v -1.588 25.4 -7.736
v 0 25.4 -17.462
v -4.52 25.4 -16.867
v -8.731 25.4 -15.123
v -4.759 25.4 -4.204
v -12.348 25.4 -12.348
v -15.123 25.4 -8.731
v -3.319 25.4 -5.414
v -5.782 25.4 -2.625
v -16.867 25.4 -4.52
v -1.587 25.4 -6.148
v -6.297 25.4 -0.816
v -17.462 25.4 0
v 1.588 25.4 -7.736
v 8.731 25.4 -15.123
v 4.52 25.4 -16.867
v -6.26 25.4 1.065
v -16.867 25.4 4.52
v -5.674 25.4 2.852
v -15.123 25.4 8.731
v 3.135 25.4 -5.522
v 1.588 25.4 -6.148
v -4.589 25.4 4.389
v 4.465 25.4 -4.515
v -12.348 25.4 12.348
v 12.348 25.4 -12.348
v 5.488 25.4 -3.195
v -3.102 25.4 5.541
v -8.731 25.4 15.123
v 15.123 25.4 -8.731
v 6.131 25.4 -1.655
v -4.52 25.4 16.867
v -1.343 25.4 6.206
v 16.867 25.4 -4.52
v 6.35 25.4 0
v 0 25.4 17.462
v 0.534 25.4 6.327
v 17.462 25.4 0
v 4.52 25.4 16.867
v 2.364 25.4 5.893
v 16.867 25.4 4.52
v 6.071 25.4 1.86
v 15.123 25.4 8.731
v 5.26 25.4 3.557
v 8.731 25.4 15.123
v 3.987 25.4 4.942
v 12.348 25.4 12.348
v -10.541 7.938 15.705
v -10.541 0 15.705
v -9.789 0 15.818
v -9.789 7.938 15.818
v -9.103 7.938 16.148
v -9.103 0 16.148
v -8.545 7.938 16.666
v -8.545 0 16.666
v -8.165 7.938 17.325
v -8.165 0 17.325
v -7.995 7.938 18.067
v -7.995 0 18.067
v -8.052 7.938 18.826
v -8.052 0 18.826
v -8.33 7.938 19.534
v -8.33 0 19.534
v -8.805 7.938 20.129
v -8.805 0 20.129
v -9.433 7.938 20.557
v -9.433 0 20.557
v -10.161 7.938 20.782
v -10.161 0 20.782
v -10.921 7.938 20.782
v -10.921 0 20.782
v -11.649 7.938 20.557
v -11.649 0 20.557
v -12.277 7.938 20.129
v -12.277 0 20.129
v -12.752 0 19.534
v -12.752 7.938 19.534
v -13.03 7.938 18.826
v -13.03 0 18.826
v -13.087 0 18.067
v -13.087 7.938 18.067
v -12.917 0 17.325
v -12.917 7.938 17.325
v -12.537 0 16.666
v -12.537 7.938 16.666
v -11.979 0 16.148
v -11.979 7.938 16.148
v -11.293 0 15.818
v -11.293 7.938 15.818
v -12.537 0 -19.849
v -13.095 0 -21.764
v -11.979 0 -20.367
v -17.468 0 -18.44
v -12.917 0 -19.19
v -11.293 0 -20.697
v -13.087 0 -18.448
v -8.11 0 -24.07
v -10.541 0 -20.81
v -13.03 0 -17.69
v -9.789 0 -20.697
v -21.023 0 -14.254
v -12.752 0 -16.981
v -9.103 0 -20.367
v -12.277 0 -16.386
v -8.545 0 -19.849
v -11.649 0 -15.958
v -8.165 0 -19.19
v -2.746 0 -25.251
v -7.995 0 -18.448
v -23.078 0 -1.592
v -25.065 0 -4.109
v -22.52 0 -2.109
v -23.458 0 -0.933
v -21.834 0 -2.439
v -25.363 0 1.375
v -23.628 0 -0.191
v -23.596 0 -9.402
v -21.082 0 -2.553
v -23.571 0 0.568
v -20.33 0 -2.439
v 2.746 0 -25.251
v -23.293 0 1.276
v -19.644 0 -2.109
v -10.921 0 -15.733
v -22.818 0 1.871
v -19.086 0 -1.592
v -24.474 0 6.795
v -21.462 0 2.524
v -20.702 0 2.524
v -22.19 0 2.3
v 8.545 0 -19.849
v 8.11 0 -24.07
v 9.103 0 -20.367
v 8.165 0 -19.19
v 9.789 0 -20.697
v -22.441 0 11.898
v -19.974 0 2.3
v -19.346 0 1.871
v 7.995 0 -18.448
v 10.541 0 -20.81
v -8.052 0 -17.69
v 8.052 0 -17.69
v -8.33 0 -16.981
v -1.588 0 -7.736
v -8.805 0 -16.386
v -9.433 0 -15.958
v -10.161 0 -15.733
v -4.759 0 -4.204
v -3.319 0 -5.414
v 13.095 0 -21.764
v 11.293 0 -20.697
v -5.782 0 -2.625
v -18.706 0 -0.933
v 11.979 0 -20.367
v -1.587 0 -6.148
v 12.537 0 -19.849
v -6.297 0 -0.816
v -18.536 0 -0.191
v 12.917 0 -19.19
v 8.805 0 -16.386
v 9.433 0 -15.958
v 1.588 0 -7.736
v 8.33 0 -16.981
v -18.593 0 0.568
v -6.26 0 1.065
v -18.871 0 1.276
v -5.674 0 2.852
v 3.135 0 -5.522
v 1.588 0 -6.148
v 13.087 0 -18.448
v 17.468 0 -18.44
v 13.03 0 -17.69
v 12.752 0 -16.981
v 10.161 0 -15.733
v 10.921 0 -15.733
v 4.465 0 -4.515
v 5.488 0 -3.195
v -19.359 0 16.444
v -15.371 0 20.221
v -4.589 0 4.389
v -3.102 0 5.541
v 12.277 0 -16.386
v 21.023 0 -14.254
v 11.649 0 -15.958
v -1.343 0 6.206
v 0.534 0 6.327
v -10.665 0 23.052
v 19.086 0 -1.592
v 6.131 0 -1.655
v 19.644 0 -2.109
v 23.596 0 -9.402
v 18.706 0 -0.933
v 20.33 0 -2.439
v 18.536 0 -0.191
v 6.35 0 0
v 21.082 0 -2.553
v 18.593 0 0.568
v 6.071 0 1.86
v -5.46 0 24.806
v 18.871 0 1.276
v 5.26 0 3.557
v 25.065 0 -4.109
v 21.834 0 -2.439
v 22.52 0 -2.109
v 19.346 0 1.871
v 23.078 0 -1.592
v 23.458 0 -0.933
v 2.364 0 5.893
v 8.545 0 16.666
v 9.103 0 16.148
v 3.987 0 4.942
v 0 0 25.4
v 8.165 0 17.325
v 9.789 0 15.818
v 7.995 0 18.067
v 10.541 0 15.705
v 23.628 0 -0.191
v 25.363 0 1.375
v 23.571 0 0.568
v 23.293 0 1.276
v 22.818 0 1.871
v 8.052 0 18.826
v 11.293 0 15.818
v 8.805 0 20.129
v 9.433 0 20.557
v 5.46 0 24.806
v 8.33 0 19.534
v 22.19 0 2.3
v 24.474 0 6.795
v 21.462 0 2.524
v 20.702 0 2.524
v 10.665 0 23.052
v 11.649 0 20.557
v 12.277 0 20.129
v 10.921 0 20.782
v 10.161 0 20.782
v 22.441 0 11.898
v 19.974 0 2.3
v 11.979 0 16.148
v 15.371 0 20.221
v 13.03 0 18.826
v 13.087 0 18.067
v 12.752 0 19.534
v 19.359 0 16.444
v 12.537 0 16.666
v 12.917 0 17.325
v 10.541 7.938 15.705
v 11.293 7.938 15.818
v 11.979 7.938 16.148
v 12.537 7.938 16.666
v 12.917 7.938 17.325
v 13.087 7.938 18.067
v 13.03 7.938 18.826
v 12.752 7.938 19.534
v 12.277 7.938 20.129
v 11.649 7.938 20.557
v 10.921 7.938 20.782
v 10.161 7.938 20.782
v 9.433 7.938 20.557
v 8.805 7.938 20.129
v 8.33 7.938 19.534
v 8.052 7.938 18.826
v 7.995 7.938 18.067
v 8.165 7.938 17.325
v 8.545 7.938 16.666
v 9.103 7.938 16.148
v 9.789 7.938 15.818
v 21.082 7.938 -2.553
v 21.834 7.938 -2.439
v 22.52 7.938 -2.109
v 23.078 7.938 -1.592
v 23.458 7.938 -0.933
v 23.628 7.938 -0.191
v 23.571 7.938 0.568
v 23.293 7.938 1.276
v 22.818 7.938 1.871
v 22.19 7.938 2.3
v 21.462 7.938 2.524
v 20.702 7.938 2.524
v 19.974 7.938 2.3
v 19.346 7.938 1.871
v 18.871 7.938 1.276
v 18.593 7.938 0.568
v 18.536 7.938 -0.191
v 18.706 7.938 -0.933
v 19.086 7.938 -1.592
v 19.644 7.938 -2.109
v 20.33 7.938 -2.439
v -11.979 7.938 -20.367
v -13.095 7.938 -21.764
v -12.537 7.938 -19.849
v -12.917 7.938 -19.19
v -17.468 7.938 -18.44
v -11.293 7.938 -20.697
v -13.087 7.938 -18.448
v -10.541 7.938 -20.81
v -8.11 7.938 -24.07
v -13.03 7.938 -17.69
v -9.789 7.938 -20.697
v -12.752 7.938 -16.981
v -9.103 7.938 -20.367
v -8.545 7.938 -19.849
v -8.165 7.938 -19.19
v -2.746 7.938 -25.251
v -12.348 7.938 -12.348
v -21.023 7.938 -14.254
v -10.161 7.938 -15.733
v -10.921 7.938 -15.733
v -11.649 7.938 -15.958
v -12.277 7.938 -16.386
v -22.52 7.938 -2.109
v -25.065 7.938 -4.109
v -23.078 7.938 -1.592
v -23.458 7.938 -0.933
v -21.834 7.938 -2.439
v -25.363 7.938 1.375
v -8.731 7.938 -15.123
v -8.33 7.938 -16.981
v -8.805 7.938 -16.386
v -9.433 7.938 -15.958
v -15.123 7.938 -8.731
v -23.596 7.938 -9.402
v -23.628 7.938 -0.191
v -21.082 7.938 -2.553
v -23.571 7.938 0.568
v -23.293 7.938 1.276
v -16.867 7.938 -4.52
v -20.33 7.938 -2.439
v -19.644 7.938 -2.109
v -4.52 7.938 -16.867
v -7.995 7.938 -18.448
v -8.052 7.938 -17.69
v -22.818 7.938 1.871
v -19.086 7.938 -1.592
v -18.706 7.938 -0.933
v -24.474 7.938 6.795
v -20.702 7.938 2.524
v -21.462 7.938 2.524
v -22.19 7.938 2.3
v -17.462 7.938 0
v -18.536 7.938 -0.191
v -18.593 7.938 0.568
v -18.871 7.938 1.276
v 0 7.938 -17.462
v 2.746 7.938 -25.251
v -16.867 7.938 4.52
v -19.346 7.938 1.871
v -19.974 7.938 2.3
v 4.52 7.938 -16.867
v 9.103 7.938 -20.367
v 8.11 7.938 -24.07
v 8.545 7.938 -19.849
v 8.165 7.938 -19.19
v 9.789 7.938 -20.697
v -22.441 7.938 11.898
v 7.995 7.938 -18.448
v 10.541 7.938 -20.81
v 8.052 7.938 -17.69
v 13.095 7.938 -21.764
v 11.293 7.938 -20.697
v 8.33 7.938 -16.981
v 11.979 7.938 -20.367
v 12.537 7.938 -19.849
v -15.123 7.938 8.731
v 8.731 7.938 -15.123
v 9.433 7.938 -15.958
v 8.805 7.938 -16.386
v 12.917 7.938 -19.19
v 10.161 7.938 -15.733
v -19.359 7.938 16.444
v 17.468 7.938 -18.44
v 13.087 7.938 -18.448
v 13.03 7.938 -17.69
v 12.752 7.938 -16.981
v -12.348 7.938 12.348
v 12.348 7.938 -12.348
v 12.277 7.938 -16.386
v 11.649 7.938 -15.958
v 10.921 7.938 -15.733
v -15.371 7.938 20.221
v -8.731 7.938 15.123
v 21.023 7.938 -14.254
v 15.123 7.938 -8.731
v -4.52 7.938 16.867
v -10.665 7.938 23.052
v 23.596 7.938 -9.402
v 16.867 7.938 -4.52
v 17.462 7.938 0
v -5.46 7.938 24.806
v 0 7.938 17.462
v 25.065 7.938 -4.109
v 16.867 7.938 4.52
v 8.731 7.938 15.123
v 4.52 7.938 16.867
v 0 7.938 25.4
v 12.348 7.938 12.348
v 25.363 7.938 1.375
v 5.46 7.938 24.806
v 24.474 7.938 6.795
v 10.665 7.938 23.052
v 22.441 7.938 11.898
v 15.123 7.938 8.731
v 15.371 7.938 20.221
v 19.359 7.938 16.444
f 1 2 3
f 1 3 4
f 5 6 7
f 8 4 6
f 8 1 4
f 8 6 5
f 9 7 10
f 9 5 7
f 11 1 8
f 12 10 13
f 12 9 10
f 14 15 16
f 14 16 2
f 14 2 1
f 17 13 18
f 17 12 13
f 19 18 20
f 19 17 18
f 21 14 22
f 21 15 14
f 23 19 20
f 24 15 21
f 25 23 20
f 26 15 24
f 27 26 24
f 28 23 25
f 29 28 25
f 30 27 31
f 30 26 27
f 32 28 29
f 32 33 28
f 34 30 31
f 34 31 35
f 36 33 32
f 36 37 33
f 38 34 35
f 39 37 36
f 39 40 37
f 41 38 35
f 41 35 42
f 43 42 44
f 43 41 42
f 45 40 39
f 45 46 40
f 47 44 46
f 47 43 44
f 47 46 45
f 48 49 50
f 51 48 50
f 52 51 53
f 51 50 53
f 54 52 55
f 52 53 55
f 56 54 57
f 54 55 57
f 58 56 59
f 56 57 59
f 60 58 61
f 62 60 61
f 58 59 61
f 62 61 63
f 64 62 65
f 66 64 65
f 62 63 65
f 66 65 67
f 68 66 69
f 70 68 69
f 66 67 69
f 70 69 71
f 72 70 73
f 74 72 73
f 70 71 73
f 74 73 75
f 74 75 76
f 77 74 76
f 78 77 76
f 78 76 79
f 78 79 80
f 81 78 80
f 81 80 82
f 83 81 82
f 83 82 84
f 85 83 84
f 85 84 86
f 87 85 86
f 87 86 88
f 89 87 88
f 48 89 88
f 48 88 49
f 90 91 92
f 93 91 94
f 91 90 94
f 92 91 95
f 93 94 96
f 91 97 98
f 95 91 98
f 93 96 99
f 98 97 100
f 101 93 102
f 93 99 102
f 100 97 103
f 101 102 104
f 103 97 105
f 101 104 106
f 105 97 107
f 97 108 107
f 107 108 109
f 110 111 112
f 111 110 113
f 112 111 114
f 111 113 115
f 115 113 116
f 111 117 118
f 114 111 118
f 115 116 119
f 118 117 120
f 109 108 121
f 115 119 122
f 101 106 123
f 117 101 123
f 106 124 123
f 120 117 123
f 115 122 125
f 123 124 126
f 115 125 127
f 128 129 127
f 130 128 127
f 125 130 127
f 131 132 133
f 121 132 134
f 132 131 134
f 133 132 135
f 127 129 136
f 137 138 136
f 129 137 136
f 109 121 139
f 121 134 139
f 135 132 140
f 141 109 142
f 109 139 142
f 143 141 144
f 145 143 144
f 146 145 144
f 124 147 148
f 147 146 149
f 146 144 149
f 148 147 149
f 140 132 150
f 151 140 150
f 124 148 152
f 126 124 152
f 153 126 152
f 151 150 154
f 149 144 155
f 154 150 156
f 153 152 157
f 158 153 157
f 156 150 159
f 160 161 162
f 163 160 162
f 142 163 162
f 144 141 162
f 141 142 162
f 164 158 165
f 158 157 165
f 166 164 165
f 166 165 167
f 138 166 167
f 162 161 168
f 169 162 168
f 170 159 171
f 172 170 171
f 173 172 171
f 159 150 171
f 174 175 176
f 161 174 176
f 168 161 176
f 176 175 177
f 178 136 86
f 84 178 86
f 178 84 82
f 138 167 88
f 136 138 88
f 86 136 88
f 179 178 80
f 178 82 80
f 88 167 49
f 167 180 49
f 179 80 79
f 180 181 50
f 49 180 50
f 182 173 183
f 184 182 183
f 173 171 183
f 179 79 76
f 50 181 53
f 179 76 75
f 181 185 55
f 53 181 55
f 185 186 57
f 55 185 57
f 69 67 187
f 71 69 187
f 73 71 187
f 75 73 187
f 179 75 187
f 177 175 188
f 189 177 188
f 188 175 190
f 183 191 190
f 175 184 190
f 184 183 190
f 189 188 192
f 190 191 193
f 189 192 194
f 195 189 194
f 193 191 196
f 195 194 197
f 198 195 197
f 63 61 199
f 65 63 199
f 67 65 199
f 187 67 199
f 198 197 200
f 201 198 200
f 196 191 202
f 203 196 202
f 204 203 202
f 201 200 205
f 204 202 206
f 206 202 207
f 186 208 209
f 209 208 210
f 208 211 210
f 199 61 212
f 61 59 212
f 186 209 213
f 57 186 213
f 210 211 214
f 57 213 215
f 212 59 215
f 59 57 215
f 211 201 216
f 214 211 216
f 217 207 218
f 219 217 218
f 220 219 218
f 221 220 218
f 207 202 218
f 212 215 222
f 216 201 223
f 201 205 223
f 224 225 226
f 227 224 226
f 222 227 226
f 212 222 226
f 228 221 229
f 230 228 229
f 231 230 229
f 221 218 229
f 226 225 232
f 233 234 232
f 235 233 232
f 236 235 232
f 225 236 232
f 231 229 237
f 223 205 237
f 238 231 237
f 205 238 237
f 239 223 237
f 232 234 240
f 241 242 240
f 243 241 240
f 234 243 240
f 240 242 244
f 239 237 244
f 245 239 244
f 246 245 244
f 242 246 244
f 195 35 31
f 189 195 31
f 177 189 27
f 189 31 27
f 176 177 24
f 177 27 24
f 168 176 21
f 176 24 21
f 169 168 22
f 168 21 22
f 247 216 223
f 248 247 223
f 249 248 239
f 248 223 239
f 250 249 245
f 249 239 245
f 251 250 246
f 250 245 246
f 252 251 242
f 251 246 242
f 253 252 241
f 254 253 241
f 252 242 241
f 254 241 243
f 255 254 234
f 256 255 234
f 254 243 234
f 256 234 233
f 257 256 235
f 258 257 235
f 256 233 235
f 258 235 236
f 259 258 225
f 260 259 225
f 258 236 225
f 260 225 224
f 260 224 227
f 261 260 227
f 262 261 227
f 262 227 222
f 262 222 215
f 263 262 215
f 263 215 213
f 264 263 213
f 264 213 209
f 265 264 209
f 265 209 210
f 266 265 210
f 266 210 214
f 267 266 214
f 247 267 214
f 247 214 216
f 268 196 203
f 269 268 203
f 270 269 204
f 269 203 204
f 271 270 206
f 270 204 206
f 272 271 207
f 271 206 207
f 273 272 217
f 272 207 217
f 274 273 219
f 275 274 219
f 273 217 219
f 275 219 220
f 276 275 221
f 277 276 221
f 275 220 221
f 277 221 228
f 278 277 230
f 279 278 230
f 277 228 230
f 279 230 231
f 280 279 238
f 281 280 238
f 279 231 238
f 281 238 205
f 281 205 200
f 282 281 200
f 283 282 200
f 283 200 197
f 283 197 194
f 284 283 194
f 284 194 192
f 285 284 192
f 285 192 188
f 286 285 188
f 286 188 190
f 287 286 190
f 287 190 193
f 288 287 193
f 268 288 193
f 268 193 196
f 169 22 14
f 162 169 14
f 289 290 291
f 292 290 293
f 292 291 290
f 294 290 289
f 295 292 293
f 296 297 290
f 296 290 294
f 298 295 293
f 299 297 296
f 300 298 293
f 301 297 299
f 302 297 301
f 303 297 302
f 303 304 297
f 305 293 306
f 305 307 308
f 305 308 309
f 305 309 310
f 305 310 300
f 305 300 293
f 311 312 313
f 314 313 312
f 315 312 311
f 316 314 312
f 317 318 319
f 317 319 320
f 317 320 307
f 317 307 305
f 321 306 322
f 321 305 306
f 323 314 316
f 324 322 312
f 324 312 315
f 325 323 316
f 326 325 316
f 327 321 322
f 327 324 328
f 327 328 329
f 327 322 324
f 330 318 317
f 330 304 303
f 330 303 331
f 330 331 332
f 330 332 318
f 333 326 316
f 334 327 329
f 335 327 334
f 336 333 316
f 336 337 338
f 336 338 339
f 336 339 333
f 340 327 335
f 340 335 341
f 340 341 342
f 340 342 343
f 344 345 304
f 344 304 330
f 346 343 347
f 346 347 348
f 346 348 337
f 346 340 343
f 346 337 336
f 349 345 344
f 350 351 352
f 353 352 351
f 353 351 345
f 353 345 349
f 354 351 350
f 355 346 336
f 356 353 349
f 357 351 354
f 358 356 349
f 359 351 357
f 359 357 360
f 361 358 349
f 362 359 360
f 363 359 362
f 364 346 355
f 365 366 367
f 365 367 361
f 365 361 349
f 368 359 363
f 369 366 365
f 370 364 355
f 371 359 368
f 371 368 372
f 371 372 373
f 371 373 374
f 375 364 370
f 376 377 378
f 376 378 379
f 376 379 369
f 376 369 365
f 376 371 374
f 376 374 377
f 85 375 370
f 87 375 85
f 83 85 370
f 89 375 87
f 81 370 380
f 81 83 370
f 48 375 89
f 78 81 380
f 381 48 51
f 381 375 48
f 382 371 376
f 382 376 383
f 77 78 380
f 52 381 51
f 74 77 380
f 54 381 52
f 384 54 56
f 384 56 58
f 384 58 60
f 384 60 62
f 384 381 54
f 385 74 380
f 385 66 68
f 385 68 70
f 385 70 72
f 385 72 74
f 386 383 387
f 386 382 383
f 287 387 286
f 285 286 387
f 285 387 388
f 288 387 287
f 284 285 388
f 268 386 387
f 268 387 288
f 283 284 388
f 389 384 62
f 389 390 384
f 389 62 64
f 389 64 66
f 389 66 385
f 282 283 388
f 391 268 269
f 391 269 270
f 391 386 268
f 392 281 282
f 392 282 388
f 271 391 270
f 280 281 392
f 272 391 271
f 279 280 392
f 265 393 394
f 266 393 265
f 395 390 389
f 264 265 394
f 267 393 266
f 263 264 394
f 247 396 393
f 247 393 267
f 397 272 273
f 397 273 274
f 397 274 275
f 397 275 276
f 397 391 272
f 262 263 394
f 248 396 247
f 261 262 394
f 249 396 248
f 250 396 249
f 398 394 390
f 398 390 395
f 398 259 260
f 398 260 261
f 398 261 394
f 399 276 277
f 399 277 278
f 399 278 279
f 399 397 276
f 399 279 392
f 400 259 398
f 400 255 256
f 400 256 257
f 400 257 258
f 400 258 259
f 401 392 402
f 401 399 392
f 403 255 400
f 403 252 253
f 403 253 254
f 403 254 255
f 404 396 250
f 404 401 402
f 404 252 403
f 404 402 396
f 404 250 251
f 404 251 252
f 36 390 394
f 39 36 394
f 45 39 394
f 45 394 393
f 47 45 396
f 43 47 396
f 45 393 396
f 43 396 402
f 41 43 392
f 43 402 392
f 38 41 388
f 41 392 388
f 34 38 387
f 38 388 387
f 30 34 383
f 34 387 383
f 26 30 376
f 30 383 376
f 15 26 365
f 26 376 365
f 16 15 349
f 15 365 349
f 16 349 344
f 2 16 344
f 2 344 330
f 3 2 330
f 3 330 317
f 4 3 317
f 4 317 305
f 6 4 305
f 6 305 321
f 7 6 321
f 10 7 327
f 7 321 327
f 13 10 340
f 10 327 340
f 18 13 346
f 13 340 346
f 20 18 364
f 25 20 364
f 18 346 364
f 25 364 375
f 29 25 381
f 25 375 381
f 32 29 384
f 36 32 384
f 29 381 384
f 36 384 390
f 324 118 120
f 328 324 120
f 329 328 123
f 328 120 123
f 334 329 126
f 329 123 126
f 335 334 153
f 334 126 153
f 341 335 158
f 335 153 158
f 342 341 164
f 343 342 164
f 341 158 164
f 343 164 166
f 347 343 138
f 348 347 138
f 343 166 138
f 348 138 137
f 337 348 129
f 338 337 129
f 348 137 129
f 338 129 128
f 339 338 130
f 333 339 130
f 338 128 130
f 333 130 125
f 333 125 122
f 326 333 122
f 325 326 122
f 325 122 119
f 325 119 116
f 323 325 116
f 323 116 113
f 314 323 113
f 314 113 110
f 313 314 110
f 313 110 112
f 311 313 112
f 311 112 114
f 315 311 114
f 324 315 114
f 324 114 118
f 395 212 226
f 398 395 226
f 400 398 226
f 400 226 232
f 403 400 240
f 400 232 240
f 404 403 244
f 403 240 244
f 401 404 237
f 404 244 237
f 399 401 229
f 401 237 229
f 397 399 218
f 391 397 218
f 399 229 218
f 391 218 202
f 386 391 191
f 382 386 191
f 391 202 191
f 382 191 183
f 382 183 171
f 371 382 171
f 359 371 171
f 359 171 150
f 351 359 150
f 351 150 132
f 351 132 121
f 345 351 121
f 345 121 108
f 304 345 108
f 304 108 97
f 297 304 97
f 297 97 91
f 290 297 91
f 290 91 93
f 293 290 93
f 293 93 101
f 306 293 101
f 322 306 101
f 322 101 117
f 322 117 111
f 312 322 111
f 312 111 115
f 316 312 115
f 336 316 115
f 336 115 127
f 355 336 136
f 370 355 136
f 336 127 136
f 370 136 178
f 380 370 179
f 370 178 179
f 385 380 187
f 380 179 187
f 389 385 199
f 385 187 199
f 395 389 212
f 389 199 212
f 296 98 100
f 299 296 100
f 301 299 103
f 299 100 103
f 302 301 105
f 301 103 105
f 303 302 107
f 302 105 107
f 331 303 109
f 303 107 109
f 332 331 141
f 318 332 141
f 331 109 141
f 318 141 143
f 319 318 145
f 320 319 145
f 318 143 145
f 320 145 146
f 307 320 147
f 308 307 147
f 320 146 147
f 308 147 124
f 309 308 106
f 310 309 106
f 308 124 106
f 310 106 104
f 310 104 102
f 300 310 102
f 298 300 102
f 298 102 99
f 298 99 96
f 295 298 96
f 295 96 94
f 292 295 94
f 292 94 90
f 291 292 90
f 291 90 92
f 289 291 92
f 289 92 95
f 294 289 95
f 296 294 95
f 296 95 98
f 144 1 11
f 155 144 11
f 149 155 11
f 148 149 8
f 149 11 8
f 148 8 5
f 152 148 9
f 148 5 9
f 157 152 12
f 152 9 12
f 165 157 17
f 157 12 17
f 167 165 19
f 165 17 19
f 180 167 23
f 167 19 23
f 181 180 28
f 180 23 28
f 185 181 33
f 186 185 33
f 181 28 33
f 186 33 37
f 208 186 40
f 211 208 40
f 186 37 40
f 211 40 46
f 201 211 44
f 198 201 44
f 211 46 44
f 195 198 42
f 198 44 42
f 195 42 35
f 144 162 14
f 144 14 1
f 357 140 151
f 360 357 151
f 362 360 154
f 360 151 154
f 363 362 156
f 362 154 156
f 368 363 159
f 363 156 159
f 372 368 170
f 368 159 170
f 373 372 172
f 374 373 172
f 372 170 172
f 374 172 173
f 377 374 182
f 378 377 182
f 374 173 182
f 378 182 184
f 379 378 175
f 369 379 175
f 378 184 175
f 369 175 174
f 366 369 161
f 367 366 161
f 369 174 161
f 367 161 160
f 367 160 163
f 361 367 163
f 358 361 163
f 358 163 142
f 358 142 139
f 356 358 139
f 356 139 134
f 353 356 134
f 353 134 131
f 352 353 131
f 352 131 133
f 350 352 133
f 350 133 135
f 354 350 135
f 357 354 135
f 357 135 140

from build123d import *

# Parameters (mm, degrees)
SKETCH1_R              = 25.4
BOSS_EXTRUDE1_DEPTH    = 25.4
CUT_EXTRUDE1_START     = -17.4625
SKETCH2_R              = 25.4
SKETCH2_R_2            = 17.4625
CUT_EXTRUDE1_DEPTH     = 17.4625
CUT_EXTRUDE2_DEPTH     = 44.994090512
F_10_CLEARANCE_HOLE1_D = 5.1054


with BuildPart() as part:
    # Sketch1 → Boss-Extrude1 (new body)
    with BuildSketch(Plane(origin=(0, 0, 0), x_dir=(1, 0, 0), z_dir=(0, 1, 0))):
        with Locations(Location((0, 0, 0), (0, 0, 270))):
            Circle(SKETCH1_R)
    extrude(amount=BOSS_EXTRUDE1_DEPTH)

    # Sketch2 → Cut-Extrude1 (cut)
    with BuildSketch(Plane(origin=(0, 25.4, 0), x_dir=(1, 0, 0), z_dir=(0, 1, 0)).offset(CUT_EXTRUDE1_START)):
        with Locations(Location((0, 0, 0), (0, 0, 270))):
            Circle(SKETCH2_R)
        with Locations(Location((0, 0, 0), (0, 0, 270))):
            Circle(SKETCH2_R_2, mode=Mode.SUBTRACT)
    extrude(amount=CUT_EXTRUDE1_DEPTH, mode=Mode.SUBTRACT)

    # Sketch3 → Cut-Extrude2 (cut, through all)
    with BuildSketch(Plane(origin=(0, 25.4, 0), x_dir=(1, 0, 0), z_dir=(0, 1, 0))):
        with BuildLine():
            ThreePointArc((1.5875, 6.148361062), (0, 6.35), (-1.5875, 6.148361062))
            Line((-1.5875, 6.148361062), (1.5875, 6.148361062))
        make_face()
        with BuildLine():
            Line((1.5875, 6.148361062), (-1.5875, 6.148361062))
            ThreePointArc((-1.5875, 6.148361062), (-3.888564967, -5.020115786), (6.35, 0))
            ThreePointArc((6.35, 0), (5.020115786, 3.888564967), (1.5875, 6.148361062))
        make_face()
        with BuildLine():
            Line((-1.5875, 7.735861062), (-1.5875, 6.148361062))
            ThreePointArc((-1.5875, 6.148361062), (0, 6.35), (1.5875, 6.148361062))
            Line((1.5875, 6.148361062), (1.5875, 7.735861062))
            Line((1.5875, 7.735861062), (-1.5875, 7.735861062))
        make_face()
    extrude(amount=-CUT_EXTRUDE2_DEPTH, mode=Mode.SUBTRACT)

    # #10 Clearance Hole1 (through all)
    with Locations(Plane(origin=(21.082, 7.9375, 0), x_dir=(0, 0, 1), z_dir=(0, 1, 0))):
        with Locations((0, 0), (-18.257547563, -10.541), (-18.257547563, -31.623), (0, -42.164), (18.257547563, -31.623), (18.257547563, -10.541)):
            Hole(F_10_CLEARANCE_HOLE1_D / 2)


solid = part.part
